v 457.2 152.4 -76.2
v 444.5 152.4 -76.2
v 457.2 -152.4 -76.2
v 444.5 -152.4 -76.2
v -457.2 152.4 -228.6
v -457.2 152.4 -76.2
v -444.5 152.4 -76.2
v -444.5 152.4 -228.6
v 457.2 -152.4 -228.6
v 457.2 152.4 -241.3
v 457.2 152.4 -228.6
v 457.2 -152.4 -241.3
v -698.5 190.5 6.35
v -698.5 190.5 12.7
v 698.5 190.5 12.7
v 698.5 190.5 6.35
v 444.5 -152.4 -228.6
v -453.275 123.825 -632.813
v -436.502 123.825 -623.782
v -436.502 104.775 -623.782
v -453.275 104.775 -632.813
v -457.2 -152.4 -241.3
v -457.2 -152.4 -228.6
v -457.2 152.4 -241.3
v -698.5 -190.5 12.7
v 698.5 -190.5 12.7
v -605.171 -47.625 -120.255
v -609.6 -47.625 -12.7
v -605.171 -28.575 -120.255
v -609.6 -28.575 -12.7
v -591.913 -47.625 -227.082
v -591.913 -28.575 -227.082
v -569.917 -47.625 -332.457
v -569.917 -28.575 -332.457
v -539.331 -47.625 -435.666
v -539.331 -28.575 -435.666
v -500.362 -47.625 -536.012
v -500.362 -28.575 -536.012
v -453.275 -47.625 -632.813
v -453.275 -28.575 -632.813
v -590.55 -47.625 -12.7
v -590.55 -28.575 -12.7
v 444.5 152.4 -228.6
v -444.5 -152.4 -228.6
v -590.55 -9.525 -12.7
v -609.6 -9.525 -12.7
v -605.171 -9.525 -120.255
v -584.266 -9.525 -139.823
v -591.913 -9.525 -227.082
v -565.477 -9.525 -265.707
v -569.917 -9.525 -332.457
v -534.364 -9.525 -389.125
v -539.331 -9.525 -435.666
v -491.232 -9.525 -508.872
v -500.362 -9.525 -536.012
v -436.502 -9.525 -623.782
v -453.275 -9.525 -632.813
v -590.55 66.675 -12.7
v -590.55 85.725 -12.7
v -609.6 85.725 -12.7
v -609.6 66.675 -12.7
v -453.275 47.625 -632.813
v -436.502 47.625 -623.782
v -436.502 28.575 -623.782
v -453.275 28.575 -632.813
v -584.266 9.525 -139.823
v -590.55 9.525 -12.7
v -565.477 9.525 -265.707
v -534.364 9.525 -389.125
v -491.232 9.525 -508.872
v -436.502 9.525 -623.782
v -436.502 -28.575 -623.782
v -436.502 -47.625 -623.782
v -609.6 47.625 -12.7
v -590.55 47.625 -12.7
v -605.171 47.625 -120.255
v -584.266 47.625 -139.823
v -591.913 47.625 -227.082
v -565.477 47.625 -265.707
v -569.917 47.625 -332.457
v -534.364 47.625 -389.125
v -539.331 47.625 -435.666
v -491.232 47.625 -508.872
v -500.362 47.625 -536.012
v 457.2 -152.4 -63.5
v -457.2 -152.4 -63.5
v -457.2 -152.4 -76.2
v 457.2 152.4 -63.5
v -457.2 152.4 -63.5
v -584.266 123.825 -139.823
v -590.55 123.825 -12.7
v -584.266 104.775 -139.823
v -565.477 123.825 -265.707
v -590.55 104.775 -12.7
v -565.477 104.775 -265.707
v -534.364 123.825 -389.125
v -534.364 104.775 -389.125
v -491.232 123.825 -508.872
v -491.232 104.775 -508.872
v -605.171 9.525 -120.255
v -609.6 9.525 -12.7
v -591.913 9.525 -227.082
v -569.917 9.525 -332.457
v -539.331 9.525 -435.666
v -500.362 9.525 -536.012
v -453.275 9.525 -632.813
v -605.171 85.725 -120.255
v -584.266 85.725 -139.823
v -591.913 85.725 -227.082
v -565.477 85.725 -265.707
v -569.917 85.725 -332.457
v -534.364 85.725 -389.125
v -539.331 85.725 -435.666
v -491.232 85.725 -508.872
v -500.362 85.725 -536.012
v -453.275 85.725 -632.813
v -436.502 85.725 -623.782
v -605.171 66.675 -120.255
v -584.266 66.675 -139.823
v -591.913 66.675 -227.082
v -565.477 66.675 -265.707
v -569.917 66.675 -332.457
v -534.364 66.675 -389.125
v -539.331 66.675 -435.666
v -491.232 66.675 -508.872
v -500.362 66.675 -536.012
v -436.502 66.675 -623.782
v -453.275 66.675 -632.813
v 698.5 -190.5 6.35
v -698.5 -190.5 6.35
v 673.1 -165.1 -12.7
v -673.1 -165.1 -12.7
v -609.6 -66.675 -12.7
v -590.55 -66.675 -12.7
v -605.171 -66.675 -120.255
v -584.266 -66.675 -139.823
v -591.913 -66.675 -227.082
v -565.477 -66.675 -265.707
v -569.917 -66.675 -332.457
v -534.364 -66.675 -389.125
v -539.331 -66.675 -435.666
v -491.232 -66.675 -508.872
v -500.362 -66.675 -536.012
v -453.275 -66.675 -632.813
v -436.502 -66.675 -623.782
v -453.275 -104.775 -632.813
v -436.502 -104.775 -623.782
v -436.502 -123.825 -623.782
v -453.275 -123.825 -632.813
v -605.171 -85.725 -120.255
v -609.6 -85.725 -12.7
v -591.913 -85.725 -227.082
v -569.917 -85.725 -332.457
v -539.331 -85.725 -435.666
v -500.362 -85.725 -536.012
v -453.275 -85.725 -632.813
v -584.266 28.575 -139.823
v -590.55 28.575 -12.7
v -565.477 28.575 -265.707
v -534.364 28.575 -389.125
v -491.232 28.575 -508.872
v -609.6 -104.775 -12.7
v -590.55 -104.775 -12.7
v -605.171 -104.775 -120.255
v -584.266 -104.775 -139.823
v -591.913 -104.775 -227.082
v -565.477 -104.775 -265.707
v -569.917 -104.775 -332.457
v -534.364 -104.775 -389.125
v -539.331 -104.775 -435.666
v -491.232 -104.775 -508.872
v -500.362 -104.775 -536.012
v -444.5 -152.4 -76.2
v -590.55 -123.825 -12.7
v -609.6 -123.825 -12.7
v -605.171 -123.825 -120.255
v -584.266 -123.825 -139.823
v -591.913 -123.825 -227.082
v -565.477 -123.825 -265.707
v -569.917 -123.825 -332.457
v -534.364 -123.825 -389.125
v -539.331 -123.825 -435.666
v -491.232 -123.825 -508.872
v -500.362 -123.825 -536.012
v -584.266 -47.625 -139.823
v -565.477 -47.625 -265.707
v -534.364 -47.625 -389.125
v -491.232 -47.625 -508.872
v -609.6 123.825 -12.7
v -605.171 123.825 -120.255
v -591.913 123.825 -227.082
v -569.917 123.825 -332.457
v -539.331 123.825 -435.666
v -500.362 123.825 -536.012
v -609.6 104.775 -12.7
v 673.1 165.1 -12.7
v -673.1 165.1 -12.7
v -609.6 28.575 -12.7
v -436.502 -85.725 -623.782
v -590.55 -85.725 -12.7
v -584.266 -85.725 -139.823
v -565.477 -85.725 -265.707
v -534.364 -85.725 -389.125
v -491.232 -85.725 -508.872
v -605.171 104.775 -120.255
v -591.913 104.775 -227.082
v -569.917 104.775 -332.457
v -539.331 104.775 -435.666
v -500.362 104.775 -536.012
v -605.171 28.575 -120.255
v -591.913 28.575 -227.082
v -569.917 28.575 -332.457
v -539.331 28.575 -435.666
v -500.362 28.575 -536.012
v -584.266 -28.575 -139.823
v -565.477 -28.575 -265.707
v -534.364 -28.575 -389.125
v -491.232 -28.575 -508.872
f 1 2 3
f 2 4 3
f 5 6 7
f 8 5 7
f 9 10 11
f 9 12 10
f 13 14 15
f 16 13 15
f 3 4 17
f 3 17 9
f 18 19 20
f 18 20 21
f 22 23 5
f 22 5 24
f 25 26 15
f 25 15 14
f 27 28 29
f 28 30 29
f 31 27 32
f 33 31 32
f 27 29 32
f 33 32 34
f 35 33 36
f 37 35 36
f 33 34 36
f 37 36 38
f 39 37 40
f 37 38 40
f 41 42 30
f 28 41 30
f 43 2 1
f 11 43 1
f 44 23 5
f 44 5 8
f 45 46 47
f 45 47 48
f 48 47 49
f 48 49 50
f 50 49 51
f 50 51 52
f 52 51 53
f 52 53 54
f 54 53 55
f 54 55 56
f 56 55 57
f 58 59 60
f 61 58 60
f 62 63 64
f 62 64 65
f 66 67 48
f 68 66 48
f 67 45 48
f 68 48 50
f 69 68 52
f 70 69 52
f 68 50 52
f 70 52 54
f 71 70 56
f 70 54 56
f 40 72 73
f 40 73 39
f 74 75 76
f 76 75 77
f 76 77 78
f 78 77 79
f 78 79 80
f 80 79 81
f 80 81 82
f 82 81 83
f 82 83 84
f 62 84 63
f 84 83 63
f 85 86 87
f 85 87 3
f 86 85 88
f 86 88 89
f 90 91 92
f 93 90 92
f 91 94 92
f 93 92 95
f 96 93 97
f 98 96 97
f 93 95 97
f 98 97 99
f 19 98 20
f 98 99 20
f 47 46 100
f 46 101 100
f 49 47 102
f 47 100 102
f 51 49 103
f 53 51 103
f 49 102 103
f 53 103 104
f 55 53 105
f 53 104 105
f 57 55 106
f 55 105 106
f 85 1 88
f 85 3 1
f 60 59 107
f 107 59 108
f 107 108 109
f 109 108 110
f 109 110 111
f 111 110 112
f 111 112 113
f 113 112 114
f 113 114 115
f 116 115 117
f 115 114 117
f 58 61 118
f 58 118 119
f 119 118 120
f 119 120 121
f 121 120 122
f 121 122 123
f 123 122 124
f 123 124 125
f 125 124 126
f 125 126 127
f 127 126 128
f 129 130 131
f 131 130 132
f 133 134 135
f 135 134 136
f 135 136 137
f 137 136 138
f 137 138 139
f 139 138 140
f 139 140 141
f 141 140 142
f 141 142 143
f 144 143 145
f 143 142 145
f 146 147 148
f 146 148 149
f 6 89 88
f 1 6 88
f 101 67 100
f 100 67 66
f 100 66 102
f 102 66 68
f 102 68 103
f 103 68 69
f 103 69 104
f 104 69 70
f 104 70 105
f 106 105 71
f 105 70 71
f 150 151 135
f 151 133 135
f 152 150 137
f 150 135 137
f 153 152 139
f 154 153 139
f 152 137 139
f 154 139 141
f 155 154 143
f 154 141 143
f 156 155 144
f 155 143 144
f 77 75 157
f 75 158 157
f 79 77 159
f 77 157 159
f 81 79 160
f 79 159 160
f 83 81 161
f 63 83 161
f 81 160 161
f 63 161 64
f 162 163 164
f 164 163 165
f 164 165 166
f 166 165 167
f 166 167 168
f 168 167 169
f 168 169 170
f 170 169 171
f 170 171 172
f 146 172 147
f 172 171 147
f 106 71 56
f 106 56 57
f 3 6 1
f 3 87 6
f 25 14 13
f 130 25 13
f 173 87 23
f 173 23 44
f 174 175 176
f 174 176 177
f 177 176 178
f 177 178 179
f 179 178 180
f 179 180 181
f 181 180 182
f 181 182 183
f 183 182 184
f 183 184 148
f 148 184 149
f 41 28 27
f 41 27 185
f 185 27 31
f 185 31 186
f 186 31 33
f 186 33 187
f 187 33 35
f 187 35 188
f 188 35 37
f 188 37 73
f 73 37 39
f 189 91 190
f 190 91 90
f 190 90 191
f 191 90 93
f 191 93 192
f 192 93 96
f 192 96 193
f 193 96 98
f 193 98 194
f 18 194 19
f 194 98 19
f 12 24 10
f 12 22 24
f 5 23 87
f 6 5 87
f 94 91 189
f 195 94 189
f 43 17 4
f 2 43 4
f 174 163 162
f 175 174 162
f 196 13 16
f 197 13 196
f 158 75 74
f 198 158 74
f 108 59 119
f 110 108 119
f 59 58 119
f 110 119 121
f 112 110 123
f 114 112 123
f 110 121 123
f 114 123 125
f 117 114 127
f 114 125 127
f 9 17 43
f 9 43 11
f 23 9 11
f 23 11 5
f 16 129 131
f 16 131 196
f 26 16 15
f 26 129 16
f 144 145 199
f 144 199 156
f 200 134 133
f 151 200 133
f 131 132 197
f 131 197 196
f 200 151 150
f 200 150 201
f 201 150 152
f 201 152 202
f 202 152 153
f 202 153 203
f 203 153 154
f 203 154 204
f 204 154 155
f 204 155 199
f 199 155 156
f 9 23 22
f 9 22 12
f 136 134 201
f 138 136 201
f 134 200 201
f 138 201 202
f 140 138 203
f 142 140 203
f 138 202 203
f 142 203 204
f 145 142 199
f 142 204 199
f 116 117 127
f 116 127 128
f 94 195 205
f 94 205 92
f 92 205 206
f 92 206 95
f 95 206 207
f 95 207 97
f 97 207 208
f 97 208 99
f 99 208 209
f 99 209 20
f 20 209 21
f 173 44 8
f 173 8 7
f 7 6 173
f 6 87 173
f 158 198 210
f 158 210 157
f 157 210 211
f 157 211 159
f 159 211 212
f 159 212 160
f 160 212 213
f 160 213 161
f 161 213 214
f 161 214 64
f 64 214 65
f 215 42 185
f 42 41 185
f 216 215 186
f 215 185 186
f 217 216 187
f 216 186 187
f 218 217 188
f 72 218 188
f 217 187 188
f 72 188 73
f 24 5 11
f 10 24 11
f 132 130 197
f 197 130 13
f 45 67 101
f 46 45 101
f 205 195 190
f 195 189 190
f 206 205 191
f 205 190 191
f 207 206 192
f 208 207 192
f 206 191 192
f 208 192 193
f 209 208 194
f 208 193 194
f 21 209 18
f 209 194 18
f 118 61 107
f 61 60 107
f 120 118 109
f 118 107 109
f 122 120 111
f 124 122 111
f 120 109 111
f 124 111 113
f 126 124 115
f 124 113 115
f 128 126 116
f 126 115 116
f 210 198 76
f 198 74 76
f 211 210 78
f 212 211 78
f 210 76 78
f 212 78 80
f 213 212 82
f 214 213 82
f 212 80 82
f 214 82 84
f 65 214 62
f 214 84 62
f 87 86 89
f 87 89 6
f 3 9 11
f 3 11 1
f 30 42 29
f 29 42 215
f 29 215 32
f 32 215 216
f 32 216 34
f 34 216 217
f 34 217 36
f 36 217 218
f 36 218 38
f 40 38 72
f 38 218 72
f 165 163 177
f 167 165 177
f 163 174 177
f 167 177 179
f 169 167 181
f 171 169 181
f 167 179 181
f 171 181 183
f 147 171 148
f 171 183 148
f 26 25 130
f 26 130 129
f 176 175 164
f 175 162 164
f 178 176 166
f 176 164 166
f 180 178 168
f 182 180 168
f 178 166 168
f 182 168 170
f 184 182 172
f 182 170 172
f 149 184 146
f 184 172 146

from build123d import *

# Parameters (mm, degrees)
F1_DEPTH = 190.5
F0_W     = 12.7
F0_H     = 152.4
F2_DEPTH = 152.4
F3_DEPTH = 152.4
F4_SIZE2 = 19.05
F4_SIZE  = 25.4
F5_W     = 19.05
F5_H     = 19.05


with BuildPart() as f1:
    # F0 (on Front) → F1 (new body, symmetric)
    with BuildSketch(Plane.XZ):
        Polygon((-609.6, -12.7), (698.5, -12.7), (698.5, 12.7), (-698.5, 12.7), (-698.5, -12.7), align=None)
    extrude(amount=F1_DEPTH, both=True)

    # F4
    f4_edges = [f1.edges().sort_by_distance(p)[0] for p in [
        (-698.5, 0, -12.7),
        (0, -190.5, -12.7),
        (0, 190.5, -12.7),
        (698.5, 0, -12.7),
    ]]
    f4_side = f1.faces().sort_by_distance((0, 0, -12.7))[0]
    chamfer(f4_edges, length=F4_SIZE, length2=F4_SIZE2, reference=f4_side)


with BuildPart() as f2:
    # F0 (on Front) → F2 (new body, symmetric)
    with BuildSketch(Plane.XZ):
        with Locations((-450.85, -152.4)):
            Rectangle(F0_W, F0_H)
    extrude(amount=F2_DEPTH, both=True)


with BuildPart() as f2b:
    # F0 (on Front) → F2, piece 2 (new body, symmetric)
    with BuildSketch(Plane.XZ):
        with Locations((450.85, -152.4)):
            Rectangle(F0_W, F0_H)
    extrude(amount=F2_DEPTH, both=True)


with BuildPart() as f3:
    # F0 (on Front) → F3 (new body, symmetric)
    with BuildSketch(Plane.XZ):
        Polygon((457.2, -76.2), (457.2, -63.5), (-457.2, -63.5), (-457.2, -76.2), (-444.5, -76.2), (444.5, -76.2), align=None)
    extrude(amount=F3_DEPTH, both=True)


with BuildPart() as f3b:
    # F0 (on Front) → F3, piece 2 (new body, symmetric)
    with BuildSketch(Plane.XZ):
        Polygon((457.2, -241.3), (457.2, -228.6), (444.5, -228.6), (-444.5, -228.6), (-457.2, -228.6), (-457.2, -241.3), align=None)
    extrude(amount=F3_DEPTH, both=True)


with BuildPart() as f6:
    # F6: sweep along a path in F0
    with BuildLine(Plane.XZ) as f6_path:
        ThreePointArc((-609.6, -12.7), (-569.9168119081, -332.4567845547), (-453.2749464586, -632.8129596375))
    # F5 (on face) → F6 (sweep)
    with BuildSketch(Plane(origin=(0, 0, -12.7), x_dir=(1, 0, 0), z_dir=(0, 0, -1))):
        with Locations((-600.075, 0)):
            Rectangle(F5_W, F5_H)
        with Locations((-600.075, 38.1)):
            Rectangle(F5_W, F5_H)
        with Locations((-600.075, 76.2)):
            Rectangle(F5_W, F5_H)
        with Locations((-600.075, 114.3)):
            Rectangle(F5_W, F5_H)
        with Locations((-600.075, -114.3)):
            Rectangle(F5_W, F5_H)
        with Locations((-600.075, -76.2)):
            Rectangle(F5_W, F5_H)
        with Locations((-600.075, -38.1)):
            Rectangle(F5_W, F5_H)
    sweep(path=f6_path.line)


solid = Compound([f1.part, f2.part, f2b.part, f3.part, f3b.part, f6.part])
